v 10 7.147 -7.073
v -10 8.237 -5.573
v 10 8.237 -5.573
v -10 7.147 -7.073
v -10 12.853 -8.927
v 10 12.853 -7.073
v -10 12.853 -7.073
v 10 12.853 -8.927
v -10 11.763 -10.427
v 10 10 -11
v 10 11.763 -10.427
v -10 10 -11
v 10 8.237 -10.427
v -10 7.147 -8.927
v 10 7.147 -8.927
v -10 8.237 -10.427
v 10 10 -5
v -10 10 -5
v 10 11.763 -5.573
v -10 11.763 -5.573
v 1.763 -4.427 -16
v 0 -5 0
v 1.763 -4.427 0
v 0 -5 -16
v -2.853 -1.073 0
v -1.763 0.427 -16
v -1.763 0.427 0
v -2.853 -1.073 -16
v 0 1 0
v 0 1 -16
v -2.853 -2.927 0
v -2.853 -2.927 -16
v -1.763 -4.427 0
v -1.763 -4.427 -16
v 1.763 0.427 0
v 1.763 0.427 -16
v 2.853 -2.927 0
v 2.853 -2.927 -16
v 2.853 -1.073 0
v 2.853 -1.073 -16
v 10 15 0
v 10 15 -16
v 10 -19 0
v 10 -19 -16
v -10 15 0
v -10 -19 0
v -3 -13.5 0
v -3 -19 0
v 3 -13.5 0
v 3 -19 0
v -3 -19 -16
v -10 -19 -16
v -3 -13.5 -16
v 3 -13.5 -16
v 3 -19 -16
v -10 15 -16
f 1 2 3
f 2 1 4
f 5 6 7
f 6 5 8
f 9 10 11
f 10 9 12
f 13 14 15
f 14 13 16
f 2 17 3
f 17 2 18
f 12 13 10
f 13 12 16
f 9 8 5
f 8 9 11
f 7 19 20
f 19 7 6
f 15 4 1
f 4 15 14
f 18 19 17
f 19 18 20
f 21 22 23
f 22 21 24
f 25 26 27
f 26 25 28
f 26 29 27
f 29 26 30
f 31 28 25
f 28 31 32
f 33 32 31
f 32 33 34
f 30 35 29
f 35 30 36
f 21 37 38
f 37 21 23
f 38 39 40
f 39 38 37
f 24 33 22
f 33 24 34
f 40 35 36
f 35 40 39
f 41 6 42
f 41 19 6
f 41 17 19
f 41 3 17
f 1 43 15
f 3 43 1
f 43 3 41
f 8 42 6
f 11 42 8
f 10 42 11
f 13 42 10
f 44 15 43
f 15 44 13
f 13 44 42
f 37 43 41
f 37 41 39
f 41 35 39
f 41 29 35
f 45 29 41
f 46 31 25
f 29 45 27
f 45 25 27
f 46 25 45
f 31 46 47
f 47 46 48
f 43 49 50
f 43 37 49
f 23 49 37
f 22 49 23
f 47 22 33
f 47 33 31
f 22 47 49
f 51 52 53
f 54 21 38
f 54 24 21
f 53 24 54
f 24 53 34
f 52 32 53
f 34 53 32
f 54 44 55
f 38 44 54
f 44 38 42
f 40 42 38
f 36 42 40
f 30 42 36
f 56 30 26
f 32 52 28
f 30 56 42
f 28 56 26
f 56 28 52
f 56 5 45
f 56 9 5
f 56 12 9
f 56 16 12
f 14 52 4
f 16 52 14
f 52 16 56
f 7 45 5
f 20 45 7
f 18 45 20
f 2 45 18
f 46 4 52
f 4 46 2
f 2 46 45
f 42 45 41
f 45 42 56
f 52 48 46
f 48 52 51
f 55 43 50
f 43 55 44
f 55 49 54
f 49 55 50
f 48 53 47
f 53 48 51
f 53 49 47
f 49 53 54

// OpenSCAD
/*XDist=20;
YDist=12;
module BaseCube() {
    // body...
    
    difference(){
      translate([0, -2, 0])  cube([XDist,34,16],center=true);
        translate([0, 4, 0]) {
        translate([0, 6, 0])     rotate([0,90,0])cylinder(r=3, h=XDist+1, center=true);
        translate([0, -6, 0])     rotate([0,0,90])cylinder(r=3, h=XDist+1, center=true);
    }
     translate([0, -17, 0])   cube([6,7,17],center=true);
    }
}


translate([0, 0, -8]) 
BaseCube();*/
///translate([0, 12, 0]) 
//rotate([0,90,0])BaseCube();

XDist=20;
YDist=12;
module BaseCube() {
    // body...
    
    difference(){
      translate([0, -2, 0])  cube([XDist,34,16],center=true);
        translate([0, 4, 0]) {
        translate([0, 6, 0])     rotate([0,90,0])cylinder(r=3, h=XDist+1, center=true);
        translate([0, -6, 0])     rotate([0,0,90])cylinder(r=3, h=XDist+1, center=true);
    }
     translate([0, -17, 0])   cube([6,7,17],center=true);
    }
}


translate([0, 0, -8]) 
BaseCube();
///translate([0, 12, 0]) 
//rotate([0,90,0])BaseCube();
